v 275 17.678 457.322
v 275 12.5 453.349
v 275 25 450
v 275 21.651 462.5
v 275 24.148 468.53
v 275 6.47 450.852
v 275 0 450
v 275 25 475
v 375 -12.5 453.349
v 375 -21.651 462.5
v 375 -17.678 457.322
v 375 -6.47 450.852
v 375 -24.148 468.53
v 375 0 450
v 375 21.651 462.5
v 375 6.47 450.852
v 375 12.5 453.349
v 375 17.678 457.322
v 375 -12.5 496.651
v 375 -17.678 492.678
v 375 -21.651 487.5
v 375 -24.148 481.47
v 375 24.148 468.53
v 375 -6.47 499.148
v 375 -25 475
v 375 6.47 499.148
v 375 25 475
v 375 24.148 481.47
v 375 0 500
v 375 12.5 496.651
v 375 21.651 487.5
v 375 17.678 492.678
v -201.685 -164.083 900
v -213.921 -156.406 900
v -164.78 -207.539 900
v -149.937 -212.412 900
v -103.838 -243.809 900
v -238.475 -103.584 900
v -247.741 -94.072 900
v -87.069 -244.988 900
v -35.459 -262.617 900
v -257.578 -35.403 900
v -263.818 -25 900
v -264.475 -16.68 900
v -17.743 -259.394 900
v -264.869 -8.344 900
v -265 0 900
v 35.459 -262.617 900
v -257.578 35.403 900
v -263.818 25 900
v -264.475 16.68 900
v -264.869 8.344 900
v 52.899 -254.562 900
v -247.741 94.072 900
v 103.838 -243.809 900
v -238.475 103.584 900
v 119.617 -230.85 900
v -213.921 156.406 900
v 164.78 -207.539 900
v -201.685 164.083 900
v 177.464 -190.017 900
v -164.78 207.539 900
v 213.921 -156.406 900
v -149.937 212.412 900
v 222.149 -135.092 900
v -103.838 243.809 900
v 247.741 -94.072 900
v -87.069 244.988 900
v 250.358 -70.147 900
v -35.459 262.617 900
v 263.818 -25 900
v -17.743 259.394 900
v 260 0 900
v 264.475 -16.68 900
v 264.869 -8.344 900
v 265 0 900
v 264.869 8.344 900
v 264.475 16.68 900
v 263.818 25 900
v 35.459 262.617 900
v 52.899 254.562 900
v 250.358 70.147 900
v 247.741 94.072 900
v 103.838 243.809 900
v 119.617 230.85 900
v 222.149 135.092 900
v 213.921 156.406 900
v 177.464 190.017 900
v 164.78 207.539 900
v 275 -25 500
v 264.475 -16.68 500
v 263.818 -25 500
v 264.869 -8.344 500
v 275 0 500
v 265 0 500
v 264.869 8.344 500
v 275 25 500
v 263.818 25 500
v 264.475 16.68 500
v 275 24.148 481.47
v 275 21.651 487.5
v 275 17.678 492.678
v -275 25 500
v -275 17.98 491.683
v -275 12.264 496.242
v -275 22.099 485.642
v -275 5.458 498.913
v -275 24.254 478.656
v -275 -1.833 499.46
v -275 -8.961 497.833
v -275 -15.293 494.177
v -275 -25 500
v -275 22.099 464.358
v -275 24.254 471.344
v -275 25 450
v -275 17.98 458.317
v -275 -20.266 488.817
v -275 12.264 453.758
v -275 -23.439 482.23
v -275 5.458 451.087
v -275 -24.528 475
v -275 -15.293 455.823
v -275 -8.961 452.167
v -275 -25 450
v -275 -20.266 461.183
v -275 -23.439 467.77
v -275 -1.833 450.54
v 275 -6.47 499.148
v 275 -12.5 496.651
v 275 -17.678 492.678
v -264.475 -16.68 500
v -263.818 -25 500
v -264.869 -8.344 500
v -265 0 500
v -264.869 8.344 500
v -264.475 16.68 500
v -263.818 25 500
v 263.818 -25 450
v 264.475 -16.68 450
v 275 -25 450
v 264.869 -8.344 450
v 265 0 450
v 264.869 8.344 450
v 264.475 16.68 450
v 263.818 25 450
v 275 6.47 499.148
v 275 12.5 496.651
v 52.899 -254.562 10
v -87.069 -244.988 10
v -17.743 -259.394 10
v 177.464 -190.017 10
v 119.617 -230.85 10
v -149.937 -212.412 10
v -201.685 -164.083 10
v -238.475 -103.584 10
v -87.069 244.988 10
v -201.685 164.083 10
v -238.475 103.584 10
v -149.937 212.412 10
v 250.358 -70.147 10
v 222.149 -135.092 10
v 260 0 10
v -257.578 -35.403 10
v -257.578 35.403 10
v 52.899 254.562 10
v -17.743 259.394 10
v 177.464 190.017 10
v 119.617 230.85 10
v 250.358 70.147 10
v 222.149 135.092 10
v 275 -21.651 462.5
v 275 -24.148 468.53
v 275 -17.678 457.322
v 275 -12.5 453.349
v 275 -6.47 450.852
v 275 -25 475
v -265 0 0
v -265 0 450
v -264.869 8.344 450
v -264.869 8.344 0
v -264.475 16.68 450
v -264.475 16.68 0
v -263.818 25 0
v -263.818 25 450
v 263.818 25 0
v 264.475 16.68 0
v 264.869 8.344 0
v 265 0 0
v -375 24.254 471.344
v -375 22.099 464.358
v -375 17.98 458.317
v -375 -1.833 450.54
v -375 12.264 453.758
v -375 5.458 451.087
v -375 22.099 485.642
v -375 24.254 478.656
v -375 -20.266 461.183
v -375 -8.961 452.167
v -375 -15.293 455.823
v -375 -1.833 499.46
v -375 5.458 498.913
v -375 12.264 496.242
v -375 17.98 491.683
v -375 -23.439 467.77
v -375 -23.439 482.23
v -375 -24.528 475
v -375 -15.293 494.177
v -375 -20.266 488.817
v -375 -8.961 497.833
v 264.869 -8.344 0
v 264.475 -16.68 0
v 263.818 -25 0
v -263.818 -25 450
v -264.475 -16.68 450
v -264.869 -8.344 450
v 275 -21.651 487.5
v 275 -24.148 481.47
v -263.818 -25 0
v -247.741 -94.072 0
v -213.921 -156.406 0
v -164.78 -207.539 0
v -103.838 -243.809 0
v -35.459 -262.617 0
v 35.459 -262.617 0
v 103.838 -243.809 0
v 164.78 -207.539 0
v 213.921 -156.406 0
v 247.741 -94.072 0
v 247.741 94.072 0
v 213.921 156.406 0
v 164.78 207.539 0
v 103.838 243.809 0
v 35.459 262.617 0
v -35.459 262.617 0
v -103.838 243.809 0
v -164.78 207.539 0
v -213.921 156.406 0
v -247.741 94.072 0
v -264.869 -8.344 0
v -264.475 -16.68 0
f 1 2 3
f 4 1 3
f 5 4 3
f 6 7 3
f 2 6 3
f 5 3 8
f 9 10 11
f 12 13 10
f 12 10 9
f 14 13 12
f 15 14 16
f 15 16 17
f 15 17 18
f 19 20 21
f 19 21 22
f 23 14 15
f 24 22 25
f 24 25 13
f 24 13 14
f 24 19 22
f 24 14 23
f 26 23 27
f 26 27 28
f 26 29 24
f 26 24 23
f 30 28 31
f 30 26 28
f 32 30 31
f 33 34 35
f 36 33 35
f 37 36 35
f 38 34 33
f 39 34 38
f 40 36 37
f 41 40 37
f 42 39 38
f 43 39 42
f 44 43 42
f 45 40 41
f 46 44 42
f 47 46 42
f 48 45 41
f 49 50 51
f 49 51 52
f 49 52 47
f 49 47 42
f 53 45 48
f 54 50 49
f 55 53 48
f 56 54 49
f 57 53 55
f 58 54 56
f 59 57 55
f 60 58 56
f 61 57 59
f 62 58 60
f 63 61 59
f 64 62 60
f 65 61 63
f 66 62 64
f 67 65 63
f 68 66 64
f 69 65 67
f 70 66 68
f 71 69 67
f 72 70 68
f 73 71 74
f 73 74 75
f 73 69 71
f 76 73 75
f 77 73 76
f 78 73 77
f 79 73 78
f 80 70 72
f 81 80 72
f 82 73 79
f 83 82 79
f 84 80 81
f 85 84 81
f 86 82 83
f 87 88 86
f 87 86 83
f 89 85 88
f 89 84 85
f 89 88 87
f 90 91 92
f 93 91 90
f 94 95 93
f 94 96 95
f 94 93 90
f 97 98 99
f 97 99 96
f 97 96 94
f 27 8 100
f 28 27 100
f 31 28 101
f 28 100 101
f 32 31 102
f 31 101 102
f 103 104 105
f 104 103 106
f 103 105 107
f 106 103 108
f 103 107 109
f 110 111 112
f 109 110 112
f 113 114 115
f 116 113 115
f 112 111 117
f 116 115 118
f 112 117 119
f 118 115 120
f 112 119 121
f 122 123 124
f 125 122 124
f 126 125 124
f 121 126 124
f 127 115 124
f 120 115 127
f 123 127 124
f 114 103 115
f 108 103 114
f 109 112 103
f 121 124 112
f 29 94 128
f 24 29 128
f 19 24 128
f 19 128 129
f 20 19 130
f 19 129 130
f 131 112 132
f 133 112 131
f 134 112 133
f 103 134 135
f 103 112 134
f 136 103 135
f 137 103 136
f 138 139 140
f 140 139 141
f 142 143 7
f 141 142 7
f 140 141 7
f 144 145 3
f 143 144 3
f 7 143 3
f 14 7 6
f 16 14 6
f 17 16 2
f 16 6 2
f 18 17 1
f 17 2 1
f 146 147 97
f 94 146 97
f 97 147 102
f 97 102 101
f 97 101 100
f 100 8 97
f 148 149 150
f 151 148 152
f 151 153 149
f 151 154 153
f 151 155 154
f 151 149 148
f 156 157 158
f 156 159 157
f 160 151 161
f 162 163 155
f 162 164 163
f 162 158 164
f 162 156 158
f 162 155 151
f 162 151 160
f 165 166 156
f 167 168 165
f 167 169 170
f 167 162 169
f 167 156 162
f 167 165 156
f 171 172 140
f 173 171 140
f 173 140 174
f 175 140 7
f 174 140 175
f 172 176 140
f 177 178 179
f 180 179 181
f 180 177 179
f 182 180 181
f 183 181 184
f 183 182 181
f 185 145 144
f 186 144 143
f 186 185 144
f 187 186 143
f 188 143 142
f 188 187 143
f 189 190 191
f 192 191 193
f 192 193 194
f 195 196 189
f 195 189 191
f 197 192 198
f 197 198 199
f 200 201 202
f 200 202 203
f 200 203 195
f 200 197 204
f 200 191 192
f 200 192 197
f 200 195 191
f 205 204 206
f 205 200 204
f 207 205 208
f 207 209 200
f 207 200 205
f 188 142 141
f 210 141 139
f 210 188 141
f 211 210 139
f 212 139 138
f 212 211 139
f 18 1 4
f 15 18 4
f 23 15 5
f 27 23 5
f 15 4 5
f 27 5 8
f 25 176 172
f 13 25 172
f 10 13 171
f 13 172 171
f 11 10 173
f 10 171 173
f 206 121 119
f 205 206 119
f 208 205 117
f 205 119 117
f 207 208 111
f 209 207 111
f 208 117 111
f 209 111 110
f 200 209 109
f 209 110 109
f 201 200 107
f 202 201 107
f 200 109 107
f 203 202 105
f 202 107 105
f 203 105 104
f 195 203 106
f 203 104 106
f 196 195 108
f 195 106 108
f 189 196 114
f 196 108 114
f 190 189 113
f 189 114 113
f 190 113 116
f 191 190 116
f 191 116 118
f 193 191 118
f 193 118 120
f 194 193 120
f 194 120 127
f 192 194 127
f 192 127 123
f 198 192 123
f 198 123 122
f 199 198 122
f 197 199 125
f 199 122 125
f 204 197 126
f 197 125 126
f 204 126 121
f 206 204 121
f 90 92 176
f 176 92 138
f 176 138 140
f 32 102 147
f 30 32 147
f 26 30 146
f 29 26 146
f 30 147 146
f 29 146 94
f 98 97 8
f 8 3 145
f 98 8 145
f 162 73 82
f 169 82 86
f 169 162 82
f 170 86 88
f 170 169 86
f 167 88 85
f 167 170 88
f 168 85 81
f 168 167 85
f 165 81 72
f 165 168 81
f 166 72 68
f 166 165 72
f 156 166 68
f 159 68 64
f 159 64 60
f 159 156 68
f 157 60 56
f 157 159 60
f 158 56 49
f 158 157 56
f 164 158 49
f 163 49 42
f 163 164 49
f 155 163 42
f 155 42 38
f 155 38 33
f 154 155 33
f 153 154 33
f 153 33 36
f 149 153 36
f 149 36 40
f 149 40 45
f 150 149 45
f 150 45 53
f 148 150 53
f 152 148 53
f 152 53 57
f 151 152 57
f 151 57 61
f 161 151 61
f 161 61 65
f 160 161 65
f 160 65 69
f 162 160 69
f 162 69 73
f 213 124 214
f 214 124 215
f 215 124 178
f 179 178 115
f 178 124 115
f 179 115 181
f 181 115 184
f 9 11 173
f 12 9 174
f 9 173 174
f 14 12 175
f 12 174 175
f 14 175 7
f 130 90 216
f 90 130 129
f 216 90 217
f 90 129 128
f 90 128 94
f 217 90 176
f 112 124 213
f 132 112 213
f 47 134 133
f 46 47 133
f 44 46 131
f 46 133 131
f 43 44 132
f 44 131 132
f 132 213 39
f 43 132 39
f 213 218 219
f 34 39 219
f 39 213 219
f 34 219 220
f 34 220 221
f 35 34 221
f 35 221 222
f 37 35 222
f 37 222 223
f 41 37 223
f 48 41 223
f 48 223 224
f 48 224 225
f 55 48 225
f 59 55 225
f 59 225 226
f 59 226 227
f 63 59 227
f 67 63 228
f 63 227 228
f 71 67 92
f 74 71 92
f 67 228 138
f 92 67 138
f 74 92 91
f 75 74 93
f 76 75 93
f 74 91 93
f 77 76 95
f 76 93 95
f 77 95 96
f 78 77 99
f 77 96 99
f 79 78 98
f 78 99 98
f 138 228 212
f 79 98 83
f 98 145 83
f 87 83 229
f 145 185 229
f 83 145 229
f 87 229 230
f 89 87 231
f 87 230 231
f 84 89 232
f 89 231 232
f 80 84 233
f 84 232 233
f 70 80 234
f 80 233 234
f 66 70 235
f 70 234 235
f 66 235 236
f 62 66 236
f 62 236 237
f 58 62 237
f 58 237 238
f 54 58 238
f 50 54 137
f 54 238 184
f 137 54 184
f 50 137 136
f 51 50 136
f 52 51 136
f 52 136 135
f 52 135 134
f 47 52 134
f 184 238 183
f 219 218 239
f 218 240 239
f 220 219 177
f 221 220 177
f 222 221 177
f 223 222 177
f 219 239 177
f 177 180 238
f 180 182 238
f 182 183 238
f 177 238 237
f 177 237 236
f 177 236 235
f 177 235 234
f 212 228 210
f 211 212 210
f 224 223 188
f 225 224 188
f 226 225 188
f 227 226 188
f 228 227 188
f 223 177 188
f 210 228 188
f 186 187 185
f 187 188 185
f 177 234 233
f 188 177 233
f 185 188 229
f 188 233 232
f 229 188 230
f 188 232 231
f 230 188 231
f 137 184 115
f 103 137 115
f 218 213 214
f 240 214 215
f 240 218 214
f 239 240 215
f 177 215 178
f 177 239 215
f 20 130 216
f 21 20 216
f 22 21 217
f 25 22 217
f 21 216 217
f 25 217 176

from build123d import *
from build123d import SkipClean  # not in build123d's __all__

# Parameters (mm, degrees)
F0_R     = 260
F1_DEPTH = 10
F2_DEPTH = 900
F3_DEPTH = 500
F4_DEPTH = 450
F5_R     = 24.5282559267
F6_DEPTH = 100
F8_DEPTH = 100


# Not quite as in the source:
# - after a boolean that leaves OpenCascade's solid faulty, fix() repairs it


with BuildPart() as f1:
    # F0 (on Top) → F1 (new body)
    with BuildSketch(Plane.XY):
        with BuildLine():
            ThreePointArc((263.8181191655, -25), (264.7043648855, -12.5139606271), (265, 0))
            ThreePointArc((265, 0), (264.7043648855, 12.5139606271), (263.8181191655, 25))
            ThreePointArc((263.8181191655, 25), (0, 265), (-263.8181191655, 25))
            ThreePointArc((-263.8181191655, 25), (-264.7043648855, 12.5139606271), (-265, 0))
            ThreePointArc((-265, 0), (-264.7043648855, -12.5139606271), (-263.8181191655, -25))
            ThreePointArc((-263.8181191655, -25), (0, -265), (263.8181191655, -25))
        make_face()
        Circle(F0_R, mode=Mode.SUBTRACT)
        Circle(F0_R)
    extrude(amount=F1_DEPTH)

    # F0 (on Top) → F2 (join)
    with BuildSketch(Plane.XY):
        with BuildLine():
            ThreePointArc((263.8181191655, -25), (264.7043648855, -12.5139606271), (265, 0))
            ThreePointArc((265, 0), (264.7043648855, 12.5139606271), (263.8181191655, 25))
            ThreePointArc((263.8181191655, 25), (0, 265), (-263.8181191655, 25))
            ThreePointArc((-263.8181191655, 25), (-264.7043648855, 12.5139606271), (-265, 0))
            ThreePointArc((-265, 0), (-264.7043648855, -12.5139606271), (-263.8181191655, -25))
            ThreePointArc((-263.8181191655, -25), (0, -265), (263.8181191655, -25))
        make_face()
        Circle(F0_R, mode=Mode.SUBTRACT)
    extrude(amount=F2_DEPTH)

    # F0 (on Top) → F3 (join)
    with BuildSketch(Plane.XY):
        with BuildLine():
            Line((275, 0), (265, 0))
            ThreePointArc((265, 0), (264.7043648855, -12.5139606271), (263.8181191655, -25))
            Line((263.8181191655, -25), (275, -25))
            Line((275, -25), (275, 0))
        make_face()
        with BuildLine():
            ThreePointArc((263.8181191655, 25), (264.7043648855, 12.5139606271), (265, 0))
            Line((265, 0), (275, 0))
            Line((275, 0), (275, 25))
            Line((275, 25), (263.8181191655, 25))
        make_face()
        with BuildLine():
            ThreePointArc((-265, 0), (-264.7043648855, 12.5139606271), (-263.8181191655, 25))
            Line((-263.8181191655, 25), (-275, 25))
            Line((-275, 25), (-275, 0))
            Line((-275, 0), (-265, 0))
        make_face()
        with BuildLine():
            Line((-275, -25), (-263.8181191655, -25))
            ThreePointArc((-263.8181191655, -25), (-264.7043648855, -12.5139606271), (-265, 0))
            Line((-265, 0), (-275, 0))
            Line((-275, 0), (-275, -25))
        make_face()
    extrude(amount=F3_DEPTH)

    # F0 (on Top) → F4 (cut)
    with BuildSketch(Plane.XY):
        with BuildLine():
            ThreePointArc((263.8181191655, 25), (264.7043648855, 12.5139606271), (265, 0))
            Line((265, 0), (275, 0))
            Line((275, 0), (275, 25))
            Line((275, 25), (263.8181191655, 25))
        make_face()
        with BuildLine():
            Line((275, 0), (265, 0))
            ThreePointArc((265, 0), (264.7043648855, -12.5139606271), (263.8181191655, -25))
            Line((263.8181191655, -25), (275, -25))
            Line((275, -25), (275, 0))
        make_face()
        with BuildLine():
            ThreePointArc((-265, 0), (-264.7043648855, 12.5139606271), (-263.8181191655, 25))
            Line((-263.8181191655, 25), (-275, 25))
            Line((-275, 25), (-275, 0))
            Line((-275, 0), (-265, 0))
        make_face()
        with BuildLine():
            Line((-275, -25), (-263.8181191655, -25))
            ThreePointArc((-263.8181191655, -25), (-264.7043648855, -12.5139606271), (-265, 0))
            Line((-265, 0), (-275, 0))
            Line((-275, 0), (-275, -25))
        make_face()
    with SkipClean():  # cleaning this boolean's faces spoils the solid; the shape is the same uncleaned
        extrude(amount=F4_DEPTH, mode=Mode.SUBTRACT)

    # F5 (on face) → F6 (join)
    with BuildSketch(Plane(origin=(-275, 0, 0), x_dir=(0, -1, 0), z_dir=(-1, 0, 0))):
        with Locations((0, 475)):
            Circle(F5_R)
    extrude(amount=F6_DEPTH)

    add(f1.part.fix(), mode=Mode.REPLACE)

    # F7 (on face) → F8 (join)
    with BuildSketch(Plane.YZ.offset(275)):
        with BuildLine():
            Line((17.6776695297, 492.6776695297), (0, 475))
            Line((0, 475), (17.6776695297, 457.3223304703))
            ThreePointArc((17.6776695297, 457.3223304703), (23.0969883128, 465.4329141909), (25, 475))
            ThreePointArc((25, 475), (23.0969883128, 484.5670858091), (17.6776695297, 492.6776695297))
        make_face()
        with BuildLine():
            ThreePointArc((2.731e-07, 500), (-9.567085683, 498.096988365), (-17.6776695297, 492.6776695297))
            Line((-17.6776695297, 492.6776695297), (0, 475))
            Line((0, 475), (17.6776695297, 492.6776695297))
            ThreePointArc((17.6776695297, 492.6776695297), (9.5670859353, 498.0969882605), (2.731e-07, 500))
        make_face()
        with BuildLine():
            Line((0, 475), (-17.6776695297, 492.6776695297))
            ThreePointArc((-17.6776695297, 492.6776695297), (-23.0969883128, 484.5670858091), (-25, 475))
            ThreePointArc((-25, 475), (-23.0969883128, 465.4329141909), (-17.6776695297, 457.3223304703))
            Line((-17.6776695297, 457.3223304703), (0, 475))
        make_face()
        with BuildLine():
            Line((17.6776695297, 457.3223304703), (0, 475))
            Line((0, 475), (-17.6776695297, 457.3223304703))
            ThreePointArc((-17.6776695297, 457.3223304703), (-9.5670857461, 451.9030116611), (1.365e-07, 450))
            ThreePointArc((1.365e-07, 450), (9.5670858722, 451.9030117133), (17.6776695297, 457.3223304703))
        make_face()
    extrude(amount=F8_DEPTH)


solid = f1.part
